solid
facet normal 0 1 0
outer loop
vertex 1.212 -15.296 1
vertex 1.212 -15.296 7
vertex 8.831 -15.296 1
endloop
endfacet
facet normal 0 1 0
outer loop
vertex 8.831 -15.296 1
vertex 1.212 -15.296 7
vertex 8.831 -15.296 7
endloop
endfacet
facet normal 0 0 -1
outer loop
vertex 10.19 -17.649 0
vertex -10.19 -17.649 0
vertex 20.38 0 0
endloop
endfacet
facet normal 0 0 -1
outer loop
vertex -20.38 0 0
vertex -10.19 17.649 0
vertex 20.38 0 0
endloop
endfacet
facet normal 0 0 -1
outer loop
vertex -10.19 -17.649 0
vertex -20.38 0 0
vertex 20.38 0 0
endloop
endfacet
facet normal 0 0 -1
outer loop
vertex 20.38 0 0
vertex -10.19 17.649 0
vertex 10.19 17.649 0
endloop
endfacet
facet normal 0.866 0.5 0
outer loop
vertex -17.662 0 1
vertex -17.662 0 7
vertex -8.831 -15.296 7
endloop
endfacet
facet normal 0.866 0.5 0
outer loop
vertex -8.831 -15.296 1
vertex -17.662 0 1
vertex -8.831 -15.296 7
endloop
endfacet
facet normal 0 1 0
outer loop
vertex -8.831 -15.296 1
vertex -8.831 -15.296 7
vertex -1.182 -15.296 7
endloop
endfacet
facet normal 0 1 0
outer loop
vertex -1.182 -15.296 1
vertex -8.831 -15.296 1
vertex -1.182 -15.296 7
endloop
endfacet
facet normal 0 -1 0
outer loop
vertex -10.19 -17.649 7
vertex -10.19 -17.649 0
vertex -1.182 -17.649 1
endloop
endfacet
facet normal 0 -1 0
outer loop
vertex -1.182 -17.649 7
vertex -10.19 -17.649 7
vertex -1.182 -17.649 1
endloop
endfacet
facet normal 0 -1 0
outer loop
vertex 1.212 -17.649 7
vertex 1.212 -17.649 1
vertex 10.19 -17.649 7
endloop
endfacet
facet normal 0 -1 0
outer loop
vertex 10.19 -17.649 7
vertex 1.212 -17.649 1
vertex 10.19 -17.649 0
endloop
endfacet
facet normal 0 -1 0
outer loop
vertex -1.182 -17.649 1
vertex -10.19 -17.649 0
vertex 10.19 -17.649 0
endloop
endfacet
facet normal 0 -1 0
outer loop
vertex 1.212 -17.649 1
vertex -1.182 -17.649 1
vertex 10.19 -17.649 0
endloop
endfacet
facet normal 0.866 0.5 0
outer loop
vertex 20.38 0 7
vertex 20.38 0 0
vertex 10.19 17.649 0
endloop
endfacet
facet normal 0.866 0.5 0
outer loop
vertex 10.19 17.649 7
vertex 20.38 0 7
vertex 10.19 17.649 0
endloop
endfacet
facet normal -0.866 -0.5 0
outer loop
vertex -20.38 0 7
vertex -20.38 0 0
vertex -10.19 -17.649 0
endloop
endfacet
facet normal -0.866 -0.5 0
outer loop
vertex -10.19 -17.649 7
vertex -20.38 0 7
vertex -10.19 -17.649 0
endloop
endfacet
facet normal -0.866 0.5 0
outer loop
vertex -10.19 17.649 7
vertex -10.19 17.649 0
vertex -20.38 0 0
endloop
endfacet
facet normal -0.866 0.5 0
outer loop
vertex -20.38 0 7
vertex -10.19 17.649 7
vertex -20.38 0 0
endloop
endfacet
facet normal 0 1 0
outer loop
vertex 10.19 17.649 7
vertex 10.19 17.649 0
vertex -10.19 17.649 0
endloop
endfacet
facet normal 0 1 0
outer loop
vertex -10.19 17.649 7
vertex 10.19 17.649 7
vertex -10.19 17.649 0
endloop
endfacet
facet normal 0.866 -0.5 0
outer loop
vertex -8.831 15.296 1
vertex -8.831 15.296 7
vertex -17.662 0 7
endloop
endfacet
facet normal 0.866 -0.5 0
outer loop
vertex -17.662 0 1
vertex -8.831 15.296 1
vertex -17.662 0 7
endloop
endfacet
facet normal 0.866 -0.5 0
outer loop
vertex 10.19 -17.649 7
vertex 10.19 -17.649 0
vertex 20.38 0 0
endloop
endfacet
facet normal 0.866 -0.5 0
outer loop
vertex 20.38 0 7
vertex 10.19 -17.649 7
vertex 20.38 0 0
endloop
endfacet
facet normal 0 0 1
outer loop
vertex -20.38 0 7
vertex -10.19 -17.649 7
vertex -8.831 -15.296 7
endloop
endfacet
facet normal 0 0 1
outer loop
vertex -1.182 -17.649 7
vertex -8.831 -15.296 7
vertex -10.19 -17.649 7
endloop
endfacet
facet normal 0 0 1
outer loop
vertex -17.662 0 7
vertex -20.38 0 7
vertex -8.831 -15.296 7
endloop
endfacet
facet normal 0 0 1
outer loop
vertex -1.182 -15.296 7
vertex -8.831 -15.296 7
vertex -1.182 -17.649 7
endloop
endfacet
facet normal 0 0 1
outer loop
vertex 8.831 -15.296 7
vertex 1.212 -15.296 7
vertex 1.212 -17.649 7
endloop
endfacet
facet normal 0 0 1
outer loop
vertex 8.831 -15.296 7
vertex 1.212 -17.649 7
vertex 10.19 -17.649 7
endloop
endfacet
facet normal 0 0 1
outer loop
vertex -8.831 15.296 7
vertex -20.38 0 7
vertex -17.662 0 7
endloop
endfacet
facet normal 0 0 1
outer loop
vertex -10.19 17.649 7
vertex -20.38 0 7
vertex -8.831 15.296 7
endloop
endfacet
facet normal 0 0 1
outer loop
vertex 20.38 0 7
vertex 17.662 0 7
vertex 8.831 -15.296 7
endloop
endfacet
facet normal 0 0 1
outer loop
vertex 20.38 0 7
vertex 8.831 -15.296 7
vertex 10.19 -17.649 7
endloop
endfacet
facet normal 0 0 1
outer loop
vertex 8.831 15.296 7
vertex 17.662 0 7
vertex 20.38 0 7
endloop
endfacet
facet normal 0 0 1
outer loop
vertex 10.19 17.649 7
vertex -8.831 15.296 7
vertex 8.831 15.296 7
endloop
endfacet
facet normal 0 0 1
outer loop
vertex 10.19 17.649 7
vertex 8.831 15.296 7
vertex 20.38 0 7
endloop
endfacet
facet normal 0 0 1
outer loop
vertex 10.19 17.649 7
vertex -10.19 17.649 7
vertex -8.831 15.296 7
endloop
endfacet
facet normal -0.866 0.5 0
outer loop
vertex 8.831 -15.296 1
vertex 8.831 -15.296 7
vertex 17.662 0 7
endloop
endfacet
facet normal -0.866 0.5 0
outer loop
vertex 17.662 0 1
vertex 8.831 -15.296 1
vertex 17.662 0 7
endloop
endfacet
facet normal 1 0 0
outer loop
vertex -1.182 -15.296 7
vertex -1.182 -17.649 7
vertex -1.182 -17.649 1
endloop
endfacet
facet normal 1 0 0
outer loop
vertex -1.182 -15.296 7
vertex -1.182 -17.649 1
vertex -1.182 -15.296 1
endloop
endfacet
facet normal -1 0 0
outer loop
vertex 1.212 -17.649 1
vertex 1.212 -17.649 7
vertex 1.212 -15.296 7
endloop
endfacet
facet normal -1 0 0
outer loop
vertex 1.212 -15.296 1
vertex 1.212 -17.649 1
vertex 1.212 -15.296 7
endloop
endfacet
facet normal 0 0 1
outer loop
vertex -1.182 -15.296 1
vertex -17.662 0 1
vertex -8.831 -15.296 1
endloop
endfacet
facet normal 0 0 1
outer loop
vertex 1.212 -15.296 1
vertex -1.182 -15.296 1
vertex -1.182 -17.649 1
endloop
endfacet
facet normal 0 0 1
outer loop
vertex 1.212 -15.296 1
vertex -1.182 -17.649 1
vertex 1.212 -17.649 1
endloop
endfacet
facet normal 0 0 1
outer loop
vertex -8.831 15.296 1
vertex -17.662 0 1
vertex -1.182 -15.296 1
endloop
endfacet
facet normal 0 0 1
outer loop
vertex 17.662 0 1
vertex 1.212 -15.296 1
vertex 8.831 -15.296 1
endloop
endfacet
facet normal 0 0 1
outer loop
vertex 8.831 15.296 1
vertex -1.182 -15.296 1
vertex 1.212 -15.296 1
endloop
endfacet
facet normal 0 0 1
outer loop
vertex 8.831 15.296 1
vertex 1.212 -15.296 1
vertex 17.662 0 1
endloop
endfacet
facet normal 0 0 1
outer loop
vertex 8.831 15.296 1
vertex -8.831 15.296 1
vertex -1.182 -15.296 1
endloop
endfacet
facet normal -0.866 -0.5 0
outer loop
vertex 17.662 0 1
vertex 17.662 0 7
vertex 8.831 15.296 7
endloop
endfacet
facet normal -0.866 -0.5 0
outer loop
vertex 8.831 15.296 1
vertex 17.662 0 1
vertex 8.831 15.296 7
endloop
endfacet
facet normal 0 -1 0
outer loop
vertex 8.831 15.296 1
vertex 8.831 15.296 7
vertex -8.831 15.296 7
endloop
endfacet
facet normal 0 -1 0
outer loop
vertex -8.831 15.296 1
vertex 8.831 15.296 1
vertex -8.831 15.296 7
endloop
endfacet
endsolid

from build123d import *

# Parameters (mm, degrees)
F1_DEPTH = 7
F3_DEPTH = 6
F4_W     = 2.3945512949
F4_H     = 2.3532351479
F5_DEPTH = 6


with BuildPart() as f1:
    # F0 (on Top) → F1 (new body)
    with BuildSketch(Plane.XY):
        Polygon((-10.1898079023, -17.6492650062), (10.1898079023, -17.6492650062), (20.3796158046, 0), (10.1898079023, 17.6492650062), (-10.1898079023, 17.6492650062), (-20.3796158046, 0), align=None)
    extrude(amount=F1_DEPTH)

    # F2 (on face) → F3 (cut)
    with BuildSketch(Plane.XY.offset(7)):
        Polygon((-8.8311669562, -15.2960298583), (8.8311669562, -15.2960298583), (17.6623339124, 0), (8.8311669562, 15.2960298583), (-8.8311669562, 15.2960298583), (-17.6623339124, 0), align=None)
    extrude(amount=-F3_DEPTH, mode=Mode.SUBTRACT)

    # F4 (on face) → F5 (cut)
    with BuildSketch(Plane.XY.offset(7)):
        with Locations((0.0150980777, -16.4726474322)):
            Rectangle(F4_W, F4_H)
    extrude(amount=-F5_DEPTH, mode=Mode.SUBTRACT)


solid = f1.part
